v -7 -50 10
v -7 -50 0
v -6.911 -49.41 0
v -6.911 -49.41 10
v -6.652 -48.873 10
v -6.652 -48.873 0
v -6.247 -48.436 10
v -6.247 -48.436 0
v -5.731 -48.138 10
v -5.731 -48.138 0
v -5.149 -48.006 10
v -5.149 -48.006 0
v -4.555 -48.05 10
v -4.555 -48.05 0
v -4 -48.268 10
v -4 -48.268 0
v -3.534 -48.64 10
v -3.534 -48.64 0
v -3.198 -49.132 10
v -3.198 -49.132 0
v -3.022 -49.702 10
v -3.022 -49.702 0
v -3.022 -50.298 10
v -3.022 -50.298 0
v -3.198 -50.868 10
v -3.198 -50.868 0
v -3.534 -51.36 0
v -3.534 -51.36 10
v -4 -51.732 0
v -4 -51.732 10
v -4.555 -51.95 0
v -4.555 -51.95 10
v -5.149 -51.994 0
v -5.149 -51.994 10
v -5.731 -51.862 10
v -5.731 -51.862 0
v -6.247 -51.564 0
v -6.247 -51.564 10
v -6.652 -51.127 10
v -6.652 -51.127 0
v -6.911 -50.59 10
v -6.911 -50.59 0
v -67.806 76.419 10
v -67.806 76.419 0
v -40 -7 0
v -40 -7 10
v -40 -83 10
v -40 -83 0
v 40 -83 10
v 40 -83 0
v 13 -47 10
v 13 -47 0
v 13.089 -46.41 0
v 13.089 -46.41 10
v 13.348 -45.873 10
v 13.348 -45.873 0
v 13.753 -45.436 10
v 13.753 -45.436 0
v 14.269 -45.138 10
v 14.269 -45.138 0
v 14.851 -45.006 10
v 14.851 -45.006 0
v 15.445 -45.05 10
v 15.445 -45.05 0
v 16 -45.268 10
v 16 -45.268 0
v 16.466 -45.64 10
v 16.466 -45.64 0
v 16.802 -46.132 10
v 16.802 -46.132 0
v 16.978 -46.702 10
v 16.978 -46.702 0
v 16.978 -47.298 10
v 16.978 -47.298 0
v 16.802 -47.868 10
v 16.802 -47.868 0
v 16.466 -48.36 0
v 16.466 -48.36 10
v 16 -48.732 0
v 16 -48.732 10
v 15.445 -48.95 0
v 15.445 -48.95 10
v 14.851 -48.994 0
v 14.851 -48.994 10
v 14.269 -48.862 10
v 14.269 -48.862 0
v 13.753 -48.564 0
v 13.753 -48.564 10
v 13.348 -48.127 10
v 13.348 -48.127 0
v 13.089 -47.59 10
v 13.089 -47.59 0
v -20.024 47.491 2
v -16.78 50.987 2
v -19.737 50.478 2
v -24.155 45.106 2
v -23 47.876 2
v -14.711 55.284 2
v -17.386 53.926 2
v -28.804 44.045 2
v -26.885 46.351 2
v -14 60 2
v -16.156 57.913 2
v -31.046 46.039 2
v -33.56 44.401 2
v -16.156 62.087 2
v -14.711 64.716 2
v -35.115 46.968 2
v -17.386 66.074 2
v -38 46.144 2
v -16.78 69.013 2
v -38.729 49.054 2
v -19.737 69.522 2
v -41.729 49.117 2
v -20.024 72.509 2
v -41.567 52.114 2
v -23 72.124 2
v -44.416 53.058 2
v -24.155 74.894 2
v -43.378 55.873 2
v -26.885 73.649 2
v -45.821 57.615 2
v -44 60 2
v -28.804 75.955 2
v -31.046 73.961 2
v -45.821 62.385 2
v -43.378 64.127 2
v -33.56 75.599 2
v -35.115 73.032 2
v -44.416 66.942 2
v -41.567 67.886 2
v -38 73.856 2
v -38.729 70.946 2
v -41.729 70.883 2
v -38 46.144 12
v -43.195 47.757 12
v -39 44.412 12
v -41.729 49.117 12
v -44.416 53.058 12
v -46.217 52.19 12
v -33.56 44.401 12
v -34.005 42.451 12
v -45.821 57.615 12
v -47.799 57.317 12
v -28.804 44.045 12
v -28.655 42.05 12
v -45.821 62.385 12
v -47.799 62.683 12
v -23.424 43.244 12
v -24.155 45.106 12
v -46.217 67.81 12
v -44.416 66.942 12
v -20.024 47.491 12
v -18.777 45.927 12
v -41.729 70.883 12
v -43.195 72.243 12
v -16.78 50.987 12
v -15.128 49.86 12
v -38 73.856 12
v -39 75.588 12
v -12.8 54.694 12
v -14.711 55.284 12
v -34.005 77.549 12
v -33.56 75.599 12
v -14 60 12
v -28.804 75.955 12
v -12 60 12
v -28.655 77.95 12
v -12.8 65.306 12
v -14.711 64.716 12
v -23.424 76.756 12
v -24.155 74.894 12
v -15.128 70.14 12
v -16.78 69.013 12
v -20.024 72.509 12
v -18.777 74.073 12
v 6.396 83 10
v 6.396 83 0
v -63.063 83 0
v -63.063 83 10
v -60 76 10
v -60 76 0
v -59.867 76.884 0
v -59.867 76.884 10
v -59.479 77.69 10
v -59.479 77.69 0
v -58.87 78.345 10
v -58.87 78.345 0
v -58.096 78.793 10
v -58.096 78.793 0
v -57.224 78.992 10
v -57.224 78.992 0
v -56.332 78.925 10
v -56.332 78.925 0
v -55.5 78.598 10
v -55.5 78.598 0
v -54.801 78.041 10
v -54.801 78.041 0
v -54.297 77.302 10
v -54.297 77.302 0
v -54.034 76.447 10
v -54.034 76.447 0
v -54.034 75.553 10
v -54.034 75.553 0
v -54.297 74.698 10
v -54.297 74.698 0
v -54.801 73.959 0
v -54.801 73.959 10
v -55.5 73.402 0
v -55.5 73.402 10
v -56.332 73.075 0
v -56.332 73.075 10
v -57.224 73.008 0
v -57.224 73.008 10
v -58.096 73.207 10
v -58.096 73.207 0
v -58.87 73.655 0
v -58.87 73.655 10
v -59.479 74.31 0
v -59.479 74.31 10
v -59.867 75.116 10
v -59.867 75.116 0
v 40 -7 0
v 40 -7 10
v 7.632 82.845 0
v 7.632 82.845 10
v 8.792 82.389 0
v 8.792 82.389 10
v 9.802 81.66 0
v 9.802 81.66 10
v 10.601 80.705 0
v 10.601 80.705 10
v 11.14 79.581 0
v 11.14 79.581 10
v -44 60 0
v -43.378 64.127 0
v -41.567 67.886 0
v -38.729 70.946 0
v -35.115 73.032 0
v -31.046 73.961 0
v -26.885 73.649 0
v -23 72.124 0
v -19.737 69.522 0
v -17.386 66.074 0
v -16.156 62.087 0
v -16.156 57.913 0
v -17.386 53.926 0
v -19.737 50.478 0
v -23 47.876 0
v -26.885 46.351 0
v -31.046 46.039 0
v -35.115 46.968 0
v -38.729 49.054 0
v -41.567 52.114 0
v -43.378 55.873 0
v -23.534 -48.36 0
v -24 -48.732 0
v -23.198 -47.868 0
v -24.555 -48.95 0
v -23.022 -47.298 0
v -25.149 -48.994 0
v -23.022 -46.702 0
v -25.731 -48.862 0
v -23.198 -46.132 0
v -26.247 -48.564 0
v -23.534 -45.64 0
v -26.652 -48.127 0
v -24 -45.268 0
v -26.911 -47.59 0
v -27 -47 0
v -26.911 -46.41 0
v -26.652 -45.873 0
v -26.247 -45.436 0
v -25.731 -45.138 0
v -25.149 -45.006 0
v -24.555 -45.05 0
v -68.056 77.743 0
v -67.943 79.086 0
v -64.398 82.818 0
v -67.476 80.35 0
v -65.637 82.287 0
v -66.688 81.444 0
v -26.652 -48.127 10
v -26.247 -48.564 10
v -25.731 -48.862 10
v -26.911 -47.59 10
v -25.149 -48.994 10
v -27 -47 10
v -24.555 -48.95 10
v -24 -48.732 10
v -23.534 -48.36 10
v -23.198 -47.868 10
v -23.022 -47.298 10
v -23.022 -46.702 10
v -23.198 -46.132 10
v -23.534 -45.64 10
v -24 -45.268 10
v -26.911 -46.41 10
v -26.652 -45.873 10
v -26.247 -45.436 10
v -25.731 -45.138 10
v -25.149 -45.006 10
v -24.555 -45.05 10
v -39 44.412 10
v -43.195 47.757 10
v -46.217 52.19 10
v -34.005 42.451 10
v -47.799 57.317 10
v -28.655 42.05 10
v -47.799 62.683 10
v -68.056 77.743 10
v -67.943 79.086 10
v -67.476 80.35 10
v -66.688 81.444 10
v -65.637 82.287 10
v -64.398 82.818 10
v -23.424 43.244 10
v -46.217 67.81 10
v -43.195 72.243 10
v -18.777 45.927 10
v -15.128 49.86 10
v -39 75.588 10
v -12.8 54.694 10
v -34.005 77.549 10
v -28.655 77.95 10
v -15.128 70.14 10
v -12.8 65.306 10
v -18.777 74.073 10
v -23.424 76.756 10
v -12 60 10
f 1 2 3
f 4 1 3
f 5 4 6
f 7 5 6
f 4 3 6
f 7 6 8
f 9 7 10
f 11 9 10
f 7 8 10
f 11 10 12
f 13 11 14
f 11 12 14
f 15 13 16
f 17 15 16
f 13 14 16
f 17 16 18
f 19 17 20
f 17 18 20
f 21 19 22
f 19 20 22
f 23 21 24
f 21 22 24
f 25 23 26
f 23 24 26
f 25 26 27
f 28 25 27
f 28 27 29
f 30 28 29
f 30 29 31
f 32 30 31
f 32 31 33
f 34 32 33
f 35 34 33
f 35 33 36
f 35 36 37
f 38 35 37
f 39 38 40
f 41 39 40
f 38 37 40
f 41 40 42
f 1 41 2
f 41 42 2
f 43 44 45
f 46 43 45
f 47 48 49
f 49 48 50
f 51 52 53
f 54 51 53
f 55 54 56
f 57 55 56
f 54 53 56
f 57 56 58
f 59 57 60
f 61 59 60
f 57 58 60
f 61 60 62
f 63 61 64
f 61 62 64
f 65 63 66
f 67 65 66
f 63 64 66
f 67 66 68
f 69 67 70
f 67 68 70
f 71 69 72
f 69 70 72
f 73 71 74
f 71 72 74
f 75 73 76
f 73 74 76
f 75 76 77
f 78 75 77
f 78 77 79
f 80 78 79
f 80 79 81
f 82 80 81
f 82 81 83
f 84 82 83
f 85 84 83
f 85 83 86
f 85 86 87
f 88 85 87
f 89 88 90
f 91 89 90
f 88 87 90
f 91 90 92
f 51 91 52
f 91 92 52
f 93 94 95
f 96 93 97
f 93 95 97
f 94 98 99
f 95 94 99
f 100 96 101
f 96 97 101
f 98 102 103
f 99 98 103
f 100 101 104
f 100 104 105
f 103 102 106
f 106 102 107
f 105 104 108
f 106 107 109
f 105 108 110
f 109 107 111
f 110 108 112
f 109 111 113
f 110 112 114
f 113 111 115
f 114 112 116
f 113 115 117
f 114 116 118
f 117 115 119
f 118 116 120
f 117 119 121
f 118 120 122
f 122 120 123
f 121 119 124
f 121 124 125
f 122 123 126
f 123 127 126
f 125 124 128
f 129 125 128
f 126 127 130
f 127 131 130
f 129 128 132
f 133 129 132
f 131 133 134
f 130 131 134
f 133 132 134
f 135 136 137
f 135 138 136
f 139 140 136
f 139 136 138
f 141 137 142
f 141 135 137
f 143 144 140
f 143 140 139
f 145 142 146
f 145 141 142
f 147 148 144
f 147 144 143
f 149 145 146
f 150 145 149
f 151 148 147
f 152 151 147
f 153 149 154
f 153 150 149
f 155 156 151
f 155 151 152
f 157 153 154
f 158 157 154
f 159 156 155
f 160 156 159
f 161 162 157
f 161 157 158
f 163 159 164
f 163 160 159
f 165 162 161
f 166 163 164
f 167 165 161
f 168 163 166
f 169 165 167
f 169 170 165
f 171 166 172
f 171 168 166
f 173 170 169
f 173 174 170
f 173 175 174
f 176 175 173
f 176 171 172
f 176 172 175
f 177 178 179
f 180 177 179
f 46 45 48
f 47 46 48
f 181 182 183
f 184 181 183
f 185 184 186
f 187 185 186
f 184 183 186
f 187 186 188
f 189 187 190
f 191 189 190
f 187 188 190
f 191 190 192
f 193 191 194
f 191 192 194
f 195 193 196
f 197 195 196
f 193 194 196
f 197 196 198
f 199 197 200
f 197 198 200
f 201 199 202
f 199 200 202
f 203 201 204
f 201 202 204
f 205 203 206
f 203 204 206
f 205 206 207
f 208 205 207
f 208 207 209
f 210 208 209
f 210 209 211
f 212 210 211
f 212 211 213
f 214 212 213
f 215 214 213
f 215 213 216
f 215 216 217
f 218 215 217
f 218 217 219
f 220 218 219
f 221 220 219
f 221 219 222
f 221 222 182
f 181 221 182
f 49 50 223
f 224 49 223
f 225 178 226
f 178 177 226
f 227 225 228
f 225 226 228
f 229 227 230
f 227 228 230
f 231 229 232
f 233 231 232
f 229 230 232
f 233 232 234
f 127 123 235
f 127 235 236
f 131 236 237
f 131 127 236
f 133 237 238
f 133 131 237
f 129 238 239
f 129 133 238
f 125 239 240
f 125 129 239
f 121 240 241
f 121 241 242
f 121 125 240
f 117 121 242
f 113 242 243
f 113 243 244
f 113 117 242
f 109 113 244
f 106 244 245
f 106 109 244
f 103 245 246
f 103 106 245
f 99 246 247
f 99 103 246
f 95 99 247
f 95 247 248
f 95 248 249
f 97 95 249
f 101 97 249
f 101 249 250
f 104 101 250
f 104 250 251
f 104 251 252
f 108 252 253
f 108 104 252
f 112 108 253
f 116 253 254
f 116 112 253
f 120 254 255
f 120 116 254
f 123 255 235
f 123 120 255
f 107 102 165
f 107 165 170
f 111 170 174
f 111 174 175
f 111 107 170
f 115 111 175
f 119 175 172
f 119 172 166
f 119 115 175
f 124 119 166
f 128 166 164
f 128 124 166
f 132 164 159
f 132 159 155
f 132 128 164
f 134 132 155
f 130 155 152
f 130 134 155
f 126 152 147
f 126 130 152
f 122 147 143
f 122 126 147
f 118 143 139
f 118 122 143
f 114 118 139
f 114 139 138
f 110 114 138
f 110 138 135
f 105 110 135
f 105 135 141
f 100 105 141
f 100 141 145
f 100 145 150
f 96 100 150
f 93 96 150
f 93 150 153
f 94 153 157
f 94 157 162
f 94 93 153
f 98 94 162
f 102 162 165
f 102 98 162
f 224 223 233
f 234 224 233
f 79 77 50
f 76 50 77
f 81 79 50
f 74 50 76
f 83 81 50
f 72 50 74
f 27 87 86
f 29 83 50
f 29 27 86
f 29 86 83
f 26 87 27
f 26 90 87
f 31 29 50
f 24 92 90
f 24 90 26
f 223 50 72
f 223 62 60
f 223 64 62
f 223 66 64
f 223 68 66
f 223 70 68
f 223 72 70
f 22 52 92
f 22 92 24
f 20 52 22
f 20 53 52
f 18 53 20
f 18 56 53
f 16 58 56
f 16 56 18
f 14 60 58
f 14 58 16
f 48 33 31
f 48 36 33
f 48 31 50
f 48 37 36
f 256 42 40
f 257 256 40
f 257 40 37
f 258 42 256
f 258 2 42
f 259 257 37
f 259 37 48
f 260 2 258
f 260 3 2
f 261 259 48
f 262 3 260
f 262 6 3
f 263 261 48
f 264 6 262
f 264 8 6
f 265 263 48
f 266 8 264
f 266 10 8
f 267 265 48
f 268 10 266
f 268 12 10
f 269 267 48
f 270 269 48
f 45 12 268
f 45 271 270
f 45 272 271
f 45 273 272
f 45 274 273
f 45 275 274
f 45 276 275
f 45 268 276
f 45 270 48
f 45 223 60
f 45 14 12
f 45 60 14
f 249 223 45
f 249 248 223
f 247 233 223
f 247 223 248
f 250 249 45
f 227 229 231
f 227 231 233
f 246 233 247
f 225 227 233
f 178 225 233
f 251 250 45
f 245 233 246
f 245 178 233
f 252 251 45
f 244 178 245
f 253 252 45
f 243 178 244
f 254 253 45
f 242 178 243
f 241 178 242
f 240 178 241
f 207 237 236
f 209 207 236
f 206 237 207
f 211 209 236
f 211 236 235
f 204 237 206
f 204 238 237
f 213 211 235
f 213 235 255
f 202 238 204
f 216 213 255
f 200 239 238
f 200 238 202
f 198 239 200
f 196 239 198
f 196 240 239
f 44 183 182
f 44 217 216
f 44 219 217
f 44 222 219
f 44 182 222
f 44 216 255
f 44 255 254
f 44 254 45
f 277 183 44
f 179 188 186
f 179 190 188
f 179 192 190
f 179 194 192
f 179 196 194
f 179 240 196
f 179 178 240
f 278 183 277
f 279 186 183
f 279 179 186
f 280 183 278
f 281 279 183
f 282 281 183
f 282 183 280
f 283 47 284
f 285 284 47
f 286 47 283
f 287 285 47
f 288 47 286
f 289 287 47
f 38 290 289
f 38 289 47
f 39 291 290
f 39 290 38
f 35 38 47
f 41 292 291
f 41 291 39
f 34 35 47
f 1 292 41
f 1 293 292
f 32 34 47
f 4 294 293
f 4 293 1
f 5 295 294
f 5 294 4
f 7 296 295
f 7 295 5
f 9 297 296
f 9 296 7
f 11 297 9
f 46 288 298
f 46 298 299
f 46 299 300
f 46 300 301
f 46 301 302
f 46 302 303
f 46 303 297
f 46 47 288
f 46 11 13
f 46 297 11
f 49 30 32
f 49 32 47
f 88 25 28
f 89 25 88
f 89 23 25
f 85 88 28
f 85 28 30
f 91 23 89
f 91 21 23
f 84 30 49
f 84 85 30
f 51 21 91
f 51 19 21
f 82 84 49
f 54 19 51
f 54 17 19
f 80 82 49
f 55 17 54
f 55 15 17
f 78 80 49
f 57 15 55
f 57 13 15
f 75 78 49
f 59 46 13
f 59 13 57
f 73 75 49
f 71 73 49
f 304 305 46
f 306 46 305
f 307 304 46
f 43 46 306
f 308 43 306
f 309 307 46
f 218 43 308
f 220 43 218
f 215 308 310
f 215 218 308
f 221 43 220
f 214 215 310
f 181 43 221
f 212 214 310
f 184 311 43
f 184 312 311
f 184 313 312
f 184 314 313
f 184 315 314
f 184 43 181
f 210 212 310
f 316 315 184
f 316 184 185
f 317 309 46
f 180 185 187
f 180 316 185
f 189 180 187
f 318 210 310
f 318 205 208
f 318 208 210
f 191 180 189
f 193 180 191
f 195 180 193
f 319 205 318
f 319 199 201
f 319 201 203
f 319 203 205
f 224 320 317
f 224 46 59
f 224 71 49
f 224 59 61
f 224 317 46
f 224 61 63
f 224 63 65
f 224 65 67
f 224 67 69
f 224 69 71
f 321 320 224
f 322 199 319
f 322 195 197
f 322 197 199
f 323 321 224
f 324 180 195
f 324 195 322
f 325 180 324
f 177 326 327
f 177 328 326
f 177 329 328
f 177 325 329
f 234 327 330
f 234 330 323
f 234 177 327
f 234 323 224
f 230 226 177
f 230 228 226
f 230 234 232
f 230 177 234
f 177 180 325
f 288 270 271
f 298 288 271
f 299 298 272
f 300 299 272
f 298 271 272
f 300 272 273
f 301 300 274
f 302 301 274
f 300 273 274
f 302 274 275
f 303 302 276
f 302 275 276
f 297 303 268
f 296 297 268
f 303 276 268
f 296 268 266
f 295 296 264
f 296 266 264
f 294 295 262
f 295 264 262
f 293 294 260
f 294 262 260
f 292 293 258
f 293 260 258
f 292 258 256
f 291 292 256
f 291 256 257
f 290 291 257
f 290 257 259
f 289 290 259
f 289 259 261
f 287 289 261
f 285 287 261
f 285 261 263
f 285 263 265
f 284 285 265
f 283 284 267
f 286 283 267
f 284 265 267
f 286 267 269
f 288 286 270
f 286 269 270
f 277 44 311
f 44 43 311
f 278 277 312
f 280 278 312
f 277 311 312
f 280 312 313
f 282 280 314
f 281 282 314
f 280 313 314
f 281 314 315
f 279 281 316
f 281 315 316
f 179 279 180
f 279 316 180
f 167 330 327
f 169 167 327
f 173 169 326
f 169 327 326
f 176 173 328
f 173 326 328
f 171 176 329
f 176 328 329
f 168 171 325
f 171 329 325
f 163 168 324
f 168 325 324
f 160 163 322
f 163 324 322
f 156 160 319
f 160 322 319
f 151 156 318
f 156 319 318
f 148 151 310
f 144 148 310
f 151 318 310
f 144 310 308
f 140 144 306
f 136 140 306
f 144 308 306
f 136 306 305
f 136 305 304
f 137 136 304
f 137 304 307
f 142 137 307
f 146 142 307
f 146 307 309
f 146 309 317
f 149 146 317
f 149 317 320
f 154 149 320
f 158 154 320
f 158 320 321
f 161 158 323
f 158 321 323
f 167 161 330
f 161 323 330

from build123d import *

# Parameters (mm, degrees)
SKETCH1_R           = 16
BOSS_EXTRUDE1_DEPTH = 10
SKETCH2_R           = 18
SKETCH2_R_2         = 16
BOSS_EXTRUDE2_DEPTH = 2
SKETCH3_R           = 2
CUT_EXTRUDE1_DEPTH  = 10
SKETCH4_R           = 2
CUT_EXTRUDE2_DEPTH  = 10
CUT_EXTRUDE3_REACH  = 14
SKETCH5_R           = 3
FILLET1_R           = 5
BOSS_EXTRUDE4_START = -2
SKETCH8_R           = 16
SKETCH8_R_2         = 14
BOSS_EXTRUDE4_DEPTH = 2


with BuildPart() as part:
    # Sketch1 → Boss-Extrude1 (new body)
    with BuildSketch(Plane.XY):
        Polygon((-40, 83), (-70, 83), (-40, -7), (-40, -83), (40, -83), (40, -7), (10, 83), align=None)
        with Locations((-30, 60)):
            Circle(SKETCH1_R, mode=Mode.SUBTRACT)
    extrude(amount=BOSS_EXTRUDE1_DEPTH)

    # Sketch2 → Boss-Extrude2 (add)
    with BuildSketch(Plane.XY.offset(10)):
        with Locations((-30, 60)):
            Circle(SKETCH2_R)
        with Locations((-30, 60)):
            Circle(SKETCH2_R_2, mode=Mode.SUBTRACT)
    extrude(amount=BOSS_EXTRUDE2_DEPTH)

    # Sketch3 → Cut-Extrude1 (cut)
    with BuildSketch(Plane(origin=(0, 0, 0), x_dir=(-1, 0, 0), z_dir=(0, 0, -1))):
        with Locations((-15, -47)):
            Circle(SKETCH3_R)
        with Locations((25, -47)):
            Circle(SKETCH3_R)
    extrude(amount=-CUT_EXTRUDE1_DEPTH, mode=Mode.SUBTRACT)

    # Sketch4 → Cut-Extrude2 (cut)
    with BuildSketch(Plane(origin=(0, 0, 0), x_dir=(-1, 0, 0), z_dir=(0, 0, -1))):
        with Locations((5, -50)):
            Circle(SKETCH4_R)
    extrude(amount=-CUT_EXTRUDE2_DEPTH, mode=Mode.SUBTRACT)

    # Sketch5 → Cut-Extrude3 (cut, up to next)
    with BuildSketch(Plane(origin=(0, 0, 0), x_dir=(-1, 0, 0), z_dir=(0, 0, -1)), mode=Mode.PRIVATE) as cut_extrude3_sk1:
        with Locations((57, 76)):
            Circle(SKETCH5_R)
    cut_extrude3_tool1 = extrude(cut_extrude3_sk1.sketch, amount=-CUT_EXTRUDE3_REACH, mode=Mode.PRIVATE) & part.part
    add(cut_extrude3_tool1.solids().sort_by_distance((-57, 76, 0))[0], mode=Mode.SUBTRACT)

    # Fillet1
    fillet1_edges = [part.edges().sort_by_distance(p)[0] for p in [
        (-70, 83, 5),
        (10, 83, 5),
    ]]
    fillet(fillet1_edges, radius=FILLET1_R)

    # Sketch8 → Boss-Extrude4 (add)
    with BuildSketch(Plane(origin=(0, 0, 0), x_dir=(-1, 0, 0), z_dir=(0, 0, -1)).offset(BOSS_EXTRUDE4_START)):
        with Locations((30, 60)):
            Circle(SKETCH8_R)
        with Locations((30, 60)):
            Circle(SKETCH8_R_2, mode=Mode.SUBTRACT)
    extrude(amount=BOSS_EXTRUDE4_DEPTH)


solid = part.part
